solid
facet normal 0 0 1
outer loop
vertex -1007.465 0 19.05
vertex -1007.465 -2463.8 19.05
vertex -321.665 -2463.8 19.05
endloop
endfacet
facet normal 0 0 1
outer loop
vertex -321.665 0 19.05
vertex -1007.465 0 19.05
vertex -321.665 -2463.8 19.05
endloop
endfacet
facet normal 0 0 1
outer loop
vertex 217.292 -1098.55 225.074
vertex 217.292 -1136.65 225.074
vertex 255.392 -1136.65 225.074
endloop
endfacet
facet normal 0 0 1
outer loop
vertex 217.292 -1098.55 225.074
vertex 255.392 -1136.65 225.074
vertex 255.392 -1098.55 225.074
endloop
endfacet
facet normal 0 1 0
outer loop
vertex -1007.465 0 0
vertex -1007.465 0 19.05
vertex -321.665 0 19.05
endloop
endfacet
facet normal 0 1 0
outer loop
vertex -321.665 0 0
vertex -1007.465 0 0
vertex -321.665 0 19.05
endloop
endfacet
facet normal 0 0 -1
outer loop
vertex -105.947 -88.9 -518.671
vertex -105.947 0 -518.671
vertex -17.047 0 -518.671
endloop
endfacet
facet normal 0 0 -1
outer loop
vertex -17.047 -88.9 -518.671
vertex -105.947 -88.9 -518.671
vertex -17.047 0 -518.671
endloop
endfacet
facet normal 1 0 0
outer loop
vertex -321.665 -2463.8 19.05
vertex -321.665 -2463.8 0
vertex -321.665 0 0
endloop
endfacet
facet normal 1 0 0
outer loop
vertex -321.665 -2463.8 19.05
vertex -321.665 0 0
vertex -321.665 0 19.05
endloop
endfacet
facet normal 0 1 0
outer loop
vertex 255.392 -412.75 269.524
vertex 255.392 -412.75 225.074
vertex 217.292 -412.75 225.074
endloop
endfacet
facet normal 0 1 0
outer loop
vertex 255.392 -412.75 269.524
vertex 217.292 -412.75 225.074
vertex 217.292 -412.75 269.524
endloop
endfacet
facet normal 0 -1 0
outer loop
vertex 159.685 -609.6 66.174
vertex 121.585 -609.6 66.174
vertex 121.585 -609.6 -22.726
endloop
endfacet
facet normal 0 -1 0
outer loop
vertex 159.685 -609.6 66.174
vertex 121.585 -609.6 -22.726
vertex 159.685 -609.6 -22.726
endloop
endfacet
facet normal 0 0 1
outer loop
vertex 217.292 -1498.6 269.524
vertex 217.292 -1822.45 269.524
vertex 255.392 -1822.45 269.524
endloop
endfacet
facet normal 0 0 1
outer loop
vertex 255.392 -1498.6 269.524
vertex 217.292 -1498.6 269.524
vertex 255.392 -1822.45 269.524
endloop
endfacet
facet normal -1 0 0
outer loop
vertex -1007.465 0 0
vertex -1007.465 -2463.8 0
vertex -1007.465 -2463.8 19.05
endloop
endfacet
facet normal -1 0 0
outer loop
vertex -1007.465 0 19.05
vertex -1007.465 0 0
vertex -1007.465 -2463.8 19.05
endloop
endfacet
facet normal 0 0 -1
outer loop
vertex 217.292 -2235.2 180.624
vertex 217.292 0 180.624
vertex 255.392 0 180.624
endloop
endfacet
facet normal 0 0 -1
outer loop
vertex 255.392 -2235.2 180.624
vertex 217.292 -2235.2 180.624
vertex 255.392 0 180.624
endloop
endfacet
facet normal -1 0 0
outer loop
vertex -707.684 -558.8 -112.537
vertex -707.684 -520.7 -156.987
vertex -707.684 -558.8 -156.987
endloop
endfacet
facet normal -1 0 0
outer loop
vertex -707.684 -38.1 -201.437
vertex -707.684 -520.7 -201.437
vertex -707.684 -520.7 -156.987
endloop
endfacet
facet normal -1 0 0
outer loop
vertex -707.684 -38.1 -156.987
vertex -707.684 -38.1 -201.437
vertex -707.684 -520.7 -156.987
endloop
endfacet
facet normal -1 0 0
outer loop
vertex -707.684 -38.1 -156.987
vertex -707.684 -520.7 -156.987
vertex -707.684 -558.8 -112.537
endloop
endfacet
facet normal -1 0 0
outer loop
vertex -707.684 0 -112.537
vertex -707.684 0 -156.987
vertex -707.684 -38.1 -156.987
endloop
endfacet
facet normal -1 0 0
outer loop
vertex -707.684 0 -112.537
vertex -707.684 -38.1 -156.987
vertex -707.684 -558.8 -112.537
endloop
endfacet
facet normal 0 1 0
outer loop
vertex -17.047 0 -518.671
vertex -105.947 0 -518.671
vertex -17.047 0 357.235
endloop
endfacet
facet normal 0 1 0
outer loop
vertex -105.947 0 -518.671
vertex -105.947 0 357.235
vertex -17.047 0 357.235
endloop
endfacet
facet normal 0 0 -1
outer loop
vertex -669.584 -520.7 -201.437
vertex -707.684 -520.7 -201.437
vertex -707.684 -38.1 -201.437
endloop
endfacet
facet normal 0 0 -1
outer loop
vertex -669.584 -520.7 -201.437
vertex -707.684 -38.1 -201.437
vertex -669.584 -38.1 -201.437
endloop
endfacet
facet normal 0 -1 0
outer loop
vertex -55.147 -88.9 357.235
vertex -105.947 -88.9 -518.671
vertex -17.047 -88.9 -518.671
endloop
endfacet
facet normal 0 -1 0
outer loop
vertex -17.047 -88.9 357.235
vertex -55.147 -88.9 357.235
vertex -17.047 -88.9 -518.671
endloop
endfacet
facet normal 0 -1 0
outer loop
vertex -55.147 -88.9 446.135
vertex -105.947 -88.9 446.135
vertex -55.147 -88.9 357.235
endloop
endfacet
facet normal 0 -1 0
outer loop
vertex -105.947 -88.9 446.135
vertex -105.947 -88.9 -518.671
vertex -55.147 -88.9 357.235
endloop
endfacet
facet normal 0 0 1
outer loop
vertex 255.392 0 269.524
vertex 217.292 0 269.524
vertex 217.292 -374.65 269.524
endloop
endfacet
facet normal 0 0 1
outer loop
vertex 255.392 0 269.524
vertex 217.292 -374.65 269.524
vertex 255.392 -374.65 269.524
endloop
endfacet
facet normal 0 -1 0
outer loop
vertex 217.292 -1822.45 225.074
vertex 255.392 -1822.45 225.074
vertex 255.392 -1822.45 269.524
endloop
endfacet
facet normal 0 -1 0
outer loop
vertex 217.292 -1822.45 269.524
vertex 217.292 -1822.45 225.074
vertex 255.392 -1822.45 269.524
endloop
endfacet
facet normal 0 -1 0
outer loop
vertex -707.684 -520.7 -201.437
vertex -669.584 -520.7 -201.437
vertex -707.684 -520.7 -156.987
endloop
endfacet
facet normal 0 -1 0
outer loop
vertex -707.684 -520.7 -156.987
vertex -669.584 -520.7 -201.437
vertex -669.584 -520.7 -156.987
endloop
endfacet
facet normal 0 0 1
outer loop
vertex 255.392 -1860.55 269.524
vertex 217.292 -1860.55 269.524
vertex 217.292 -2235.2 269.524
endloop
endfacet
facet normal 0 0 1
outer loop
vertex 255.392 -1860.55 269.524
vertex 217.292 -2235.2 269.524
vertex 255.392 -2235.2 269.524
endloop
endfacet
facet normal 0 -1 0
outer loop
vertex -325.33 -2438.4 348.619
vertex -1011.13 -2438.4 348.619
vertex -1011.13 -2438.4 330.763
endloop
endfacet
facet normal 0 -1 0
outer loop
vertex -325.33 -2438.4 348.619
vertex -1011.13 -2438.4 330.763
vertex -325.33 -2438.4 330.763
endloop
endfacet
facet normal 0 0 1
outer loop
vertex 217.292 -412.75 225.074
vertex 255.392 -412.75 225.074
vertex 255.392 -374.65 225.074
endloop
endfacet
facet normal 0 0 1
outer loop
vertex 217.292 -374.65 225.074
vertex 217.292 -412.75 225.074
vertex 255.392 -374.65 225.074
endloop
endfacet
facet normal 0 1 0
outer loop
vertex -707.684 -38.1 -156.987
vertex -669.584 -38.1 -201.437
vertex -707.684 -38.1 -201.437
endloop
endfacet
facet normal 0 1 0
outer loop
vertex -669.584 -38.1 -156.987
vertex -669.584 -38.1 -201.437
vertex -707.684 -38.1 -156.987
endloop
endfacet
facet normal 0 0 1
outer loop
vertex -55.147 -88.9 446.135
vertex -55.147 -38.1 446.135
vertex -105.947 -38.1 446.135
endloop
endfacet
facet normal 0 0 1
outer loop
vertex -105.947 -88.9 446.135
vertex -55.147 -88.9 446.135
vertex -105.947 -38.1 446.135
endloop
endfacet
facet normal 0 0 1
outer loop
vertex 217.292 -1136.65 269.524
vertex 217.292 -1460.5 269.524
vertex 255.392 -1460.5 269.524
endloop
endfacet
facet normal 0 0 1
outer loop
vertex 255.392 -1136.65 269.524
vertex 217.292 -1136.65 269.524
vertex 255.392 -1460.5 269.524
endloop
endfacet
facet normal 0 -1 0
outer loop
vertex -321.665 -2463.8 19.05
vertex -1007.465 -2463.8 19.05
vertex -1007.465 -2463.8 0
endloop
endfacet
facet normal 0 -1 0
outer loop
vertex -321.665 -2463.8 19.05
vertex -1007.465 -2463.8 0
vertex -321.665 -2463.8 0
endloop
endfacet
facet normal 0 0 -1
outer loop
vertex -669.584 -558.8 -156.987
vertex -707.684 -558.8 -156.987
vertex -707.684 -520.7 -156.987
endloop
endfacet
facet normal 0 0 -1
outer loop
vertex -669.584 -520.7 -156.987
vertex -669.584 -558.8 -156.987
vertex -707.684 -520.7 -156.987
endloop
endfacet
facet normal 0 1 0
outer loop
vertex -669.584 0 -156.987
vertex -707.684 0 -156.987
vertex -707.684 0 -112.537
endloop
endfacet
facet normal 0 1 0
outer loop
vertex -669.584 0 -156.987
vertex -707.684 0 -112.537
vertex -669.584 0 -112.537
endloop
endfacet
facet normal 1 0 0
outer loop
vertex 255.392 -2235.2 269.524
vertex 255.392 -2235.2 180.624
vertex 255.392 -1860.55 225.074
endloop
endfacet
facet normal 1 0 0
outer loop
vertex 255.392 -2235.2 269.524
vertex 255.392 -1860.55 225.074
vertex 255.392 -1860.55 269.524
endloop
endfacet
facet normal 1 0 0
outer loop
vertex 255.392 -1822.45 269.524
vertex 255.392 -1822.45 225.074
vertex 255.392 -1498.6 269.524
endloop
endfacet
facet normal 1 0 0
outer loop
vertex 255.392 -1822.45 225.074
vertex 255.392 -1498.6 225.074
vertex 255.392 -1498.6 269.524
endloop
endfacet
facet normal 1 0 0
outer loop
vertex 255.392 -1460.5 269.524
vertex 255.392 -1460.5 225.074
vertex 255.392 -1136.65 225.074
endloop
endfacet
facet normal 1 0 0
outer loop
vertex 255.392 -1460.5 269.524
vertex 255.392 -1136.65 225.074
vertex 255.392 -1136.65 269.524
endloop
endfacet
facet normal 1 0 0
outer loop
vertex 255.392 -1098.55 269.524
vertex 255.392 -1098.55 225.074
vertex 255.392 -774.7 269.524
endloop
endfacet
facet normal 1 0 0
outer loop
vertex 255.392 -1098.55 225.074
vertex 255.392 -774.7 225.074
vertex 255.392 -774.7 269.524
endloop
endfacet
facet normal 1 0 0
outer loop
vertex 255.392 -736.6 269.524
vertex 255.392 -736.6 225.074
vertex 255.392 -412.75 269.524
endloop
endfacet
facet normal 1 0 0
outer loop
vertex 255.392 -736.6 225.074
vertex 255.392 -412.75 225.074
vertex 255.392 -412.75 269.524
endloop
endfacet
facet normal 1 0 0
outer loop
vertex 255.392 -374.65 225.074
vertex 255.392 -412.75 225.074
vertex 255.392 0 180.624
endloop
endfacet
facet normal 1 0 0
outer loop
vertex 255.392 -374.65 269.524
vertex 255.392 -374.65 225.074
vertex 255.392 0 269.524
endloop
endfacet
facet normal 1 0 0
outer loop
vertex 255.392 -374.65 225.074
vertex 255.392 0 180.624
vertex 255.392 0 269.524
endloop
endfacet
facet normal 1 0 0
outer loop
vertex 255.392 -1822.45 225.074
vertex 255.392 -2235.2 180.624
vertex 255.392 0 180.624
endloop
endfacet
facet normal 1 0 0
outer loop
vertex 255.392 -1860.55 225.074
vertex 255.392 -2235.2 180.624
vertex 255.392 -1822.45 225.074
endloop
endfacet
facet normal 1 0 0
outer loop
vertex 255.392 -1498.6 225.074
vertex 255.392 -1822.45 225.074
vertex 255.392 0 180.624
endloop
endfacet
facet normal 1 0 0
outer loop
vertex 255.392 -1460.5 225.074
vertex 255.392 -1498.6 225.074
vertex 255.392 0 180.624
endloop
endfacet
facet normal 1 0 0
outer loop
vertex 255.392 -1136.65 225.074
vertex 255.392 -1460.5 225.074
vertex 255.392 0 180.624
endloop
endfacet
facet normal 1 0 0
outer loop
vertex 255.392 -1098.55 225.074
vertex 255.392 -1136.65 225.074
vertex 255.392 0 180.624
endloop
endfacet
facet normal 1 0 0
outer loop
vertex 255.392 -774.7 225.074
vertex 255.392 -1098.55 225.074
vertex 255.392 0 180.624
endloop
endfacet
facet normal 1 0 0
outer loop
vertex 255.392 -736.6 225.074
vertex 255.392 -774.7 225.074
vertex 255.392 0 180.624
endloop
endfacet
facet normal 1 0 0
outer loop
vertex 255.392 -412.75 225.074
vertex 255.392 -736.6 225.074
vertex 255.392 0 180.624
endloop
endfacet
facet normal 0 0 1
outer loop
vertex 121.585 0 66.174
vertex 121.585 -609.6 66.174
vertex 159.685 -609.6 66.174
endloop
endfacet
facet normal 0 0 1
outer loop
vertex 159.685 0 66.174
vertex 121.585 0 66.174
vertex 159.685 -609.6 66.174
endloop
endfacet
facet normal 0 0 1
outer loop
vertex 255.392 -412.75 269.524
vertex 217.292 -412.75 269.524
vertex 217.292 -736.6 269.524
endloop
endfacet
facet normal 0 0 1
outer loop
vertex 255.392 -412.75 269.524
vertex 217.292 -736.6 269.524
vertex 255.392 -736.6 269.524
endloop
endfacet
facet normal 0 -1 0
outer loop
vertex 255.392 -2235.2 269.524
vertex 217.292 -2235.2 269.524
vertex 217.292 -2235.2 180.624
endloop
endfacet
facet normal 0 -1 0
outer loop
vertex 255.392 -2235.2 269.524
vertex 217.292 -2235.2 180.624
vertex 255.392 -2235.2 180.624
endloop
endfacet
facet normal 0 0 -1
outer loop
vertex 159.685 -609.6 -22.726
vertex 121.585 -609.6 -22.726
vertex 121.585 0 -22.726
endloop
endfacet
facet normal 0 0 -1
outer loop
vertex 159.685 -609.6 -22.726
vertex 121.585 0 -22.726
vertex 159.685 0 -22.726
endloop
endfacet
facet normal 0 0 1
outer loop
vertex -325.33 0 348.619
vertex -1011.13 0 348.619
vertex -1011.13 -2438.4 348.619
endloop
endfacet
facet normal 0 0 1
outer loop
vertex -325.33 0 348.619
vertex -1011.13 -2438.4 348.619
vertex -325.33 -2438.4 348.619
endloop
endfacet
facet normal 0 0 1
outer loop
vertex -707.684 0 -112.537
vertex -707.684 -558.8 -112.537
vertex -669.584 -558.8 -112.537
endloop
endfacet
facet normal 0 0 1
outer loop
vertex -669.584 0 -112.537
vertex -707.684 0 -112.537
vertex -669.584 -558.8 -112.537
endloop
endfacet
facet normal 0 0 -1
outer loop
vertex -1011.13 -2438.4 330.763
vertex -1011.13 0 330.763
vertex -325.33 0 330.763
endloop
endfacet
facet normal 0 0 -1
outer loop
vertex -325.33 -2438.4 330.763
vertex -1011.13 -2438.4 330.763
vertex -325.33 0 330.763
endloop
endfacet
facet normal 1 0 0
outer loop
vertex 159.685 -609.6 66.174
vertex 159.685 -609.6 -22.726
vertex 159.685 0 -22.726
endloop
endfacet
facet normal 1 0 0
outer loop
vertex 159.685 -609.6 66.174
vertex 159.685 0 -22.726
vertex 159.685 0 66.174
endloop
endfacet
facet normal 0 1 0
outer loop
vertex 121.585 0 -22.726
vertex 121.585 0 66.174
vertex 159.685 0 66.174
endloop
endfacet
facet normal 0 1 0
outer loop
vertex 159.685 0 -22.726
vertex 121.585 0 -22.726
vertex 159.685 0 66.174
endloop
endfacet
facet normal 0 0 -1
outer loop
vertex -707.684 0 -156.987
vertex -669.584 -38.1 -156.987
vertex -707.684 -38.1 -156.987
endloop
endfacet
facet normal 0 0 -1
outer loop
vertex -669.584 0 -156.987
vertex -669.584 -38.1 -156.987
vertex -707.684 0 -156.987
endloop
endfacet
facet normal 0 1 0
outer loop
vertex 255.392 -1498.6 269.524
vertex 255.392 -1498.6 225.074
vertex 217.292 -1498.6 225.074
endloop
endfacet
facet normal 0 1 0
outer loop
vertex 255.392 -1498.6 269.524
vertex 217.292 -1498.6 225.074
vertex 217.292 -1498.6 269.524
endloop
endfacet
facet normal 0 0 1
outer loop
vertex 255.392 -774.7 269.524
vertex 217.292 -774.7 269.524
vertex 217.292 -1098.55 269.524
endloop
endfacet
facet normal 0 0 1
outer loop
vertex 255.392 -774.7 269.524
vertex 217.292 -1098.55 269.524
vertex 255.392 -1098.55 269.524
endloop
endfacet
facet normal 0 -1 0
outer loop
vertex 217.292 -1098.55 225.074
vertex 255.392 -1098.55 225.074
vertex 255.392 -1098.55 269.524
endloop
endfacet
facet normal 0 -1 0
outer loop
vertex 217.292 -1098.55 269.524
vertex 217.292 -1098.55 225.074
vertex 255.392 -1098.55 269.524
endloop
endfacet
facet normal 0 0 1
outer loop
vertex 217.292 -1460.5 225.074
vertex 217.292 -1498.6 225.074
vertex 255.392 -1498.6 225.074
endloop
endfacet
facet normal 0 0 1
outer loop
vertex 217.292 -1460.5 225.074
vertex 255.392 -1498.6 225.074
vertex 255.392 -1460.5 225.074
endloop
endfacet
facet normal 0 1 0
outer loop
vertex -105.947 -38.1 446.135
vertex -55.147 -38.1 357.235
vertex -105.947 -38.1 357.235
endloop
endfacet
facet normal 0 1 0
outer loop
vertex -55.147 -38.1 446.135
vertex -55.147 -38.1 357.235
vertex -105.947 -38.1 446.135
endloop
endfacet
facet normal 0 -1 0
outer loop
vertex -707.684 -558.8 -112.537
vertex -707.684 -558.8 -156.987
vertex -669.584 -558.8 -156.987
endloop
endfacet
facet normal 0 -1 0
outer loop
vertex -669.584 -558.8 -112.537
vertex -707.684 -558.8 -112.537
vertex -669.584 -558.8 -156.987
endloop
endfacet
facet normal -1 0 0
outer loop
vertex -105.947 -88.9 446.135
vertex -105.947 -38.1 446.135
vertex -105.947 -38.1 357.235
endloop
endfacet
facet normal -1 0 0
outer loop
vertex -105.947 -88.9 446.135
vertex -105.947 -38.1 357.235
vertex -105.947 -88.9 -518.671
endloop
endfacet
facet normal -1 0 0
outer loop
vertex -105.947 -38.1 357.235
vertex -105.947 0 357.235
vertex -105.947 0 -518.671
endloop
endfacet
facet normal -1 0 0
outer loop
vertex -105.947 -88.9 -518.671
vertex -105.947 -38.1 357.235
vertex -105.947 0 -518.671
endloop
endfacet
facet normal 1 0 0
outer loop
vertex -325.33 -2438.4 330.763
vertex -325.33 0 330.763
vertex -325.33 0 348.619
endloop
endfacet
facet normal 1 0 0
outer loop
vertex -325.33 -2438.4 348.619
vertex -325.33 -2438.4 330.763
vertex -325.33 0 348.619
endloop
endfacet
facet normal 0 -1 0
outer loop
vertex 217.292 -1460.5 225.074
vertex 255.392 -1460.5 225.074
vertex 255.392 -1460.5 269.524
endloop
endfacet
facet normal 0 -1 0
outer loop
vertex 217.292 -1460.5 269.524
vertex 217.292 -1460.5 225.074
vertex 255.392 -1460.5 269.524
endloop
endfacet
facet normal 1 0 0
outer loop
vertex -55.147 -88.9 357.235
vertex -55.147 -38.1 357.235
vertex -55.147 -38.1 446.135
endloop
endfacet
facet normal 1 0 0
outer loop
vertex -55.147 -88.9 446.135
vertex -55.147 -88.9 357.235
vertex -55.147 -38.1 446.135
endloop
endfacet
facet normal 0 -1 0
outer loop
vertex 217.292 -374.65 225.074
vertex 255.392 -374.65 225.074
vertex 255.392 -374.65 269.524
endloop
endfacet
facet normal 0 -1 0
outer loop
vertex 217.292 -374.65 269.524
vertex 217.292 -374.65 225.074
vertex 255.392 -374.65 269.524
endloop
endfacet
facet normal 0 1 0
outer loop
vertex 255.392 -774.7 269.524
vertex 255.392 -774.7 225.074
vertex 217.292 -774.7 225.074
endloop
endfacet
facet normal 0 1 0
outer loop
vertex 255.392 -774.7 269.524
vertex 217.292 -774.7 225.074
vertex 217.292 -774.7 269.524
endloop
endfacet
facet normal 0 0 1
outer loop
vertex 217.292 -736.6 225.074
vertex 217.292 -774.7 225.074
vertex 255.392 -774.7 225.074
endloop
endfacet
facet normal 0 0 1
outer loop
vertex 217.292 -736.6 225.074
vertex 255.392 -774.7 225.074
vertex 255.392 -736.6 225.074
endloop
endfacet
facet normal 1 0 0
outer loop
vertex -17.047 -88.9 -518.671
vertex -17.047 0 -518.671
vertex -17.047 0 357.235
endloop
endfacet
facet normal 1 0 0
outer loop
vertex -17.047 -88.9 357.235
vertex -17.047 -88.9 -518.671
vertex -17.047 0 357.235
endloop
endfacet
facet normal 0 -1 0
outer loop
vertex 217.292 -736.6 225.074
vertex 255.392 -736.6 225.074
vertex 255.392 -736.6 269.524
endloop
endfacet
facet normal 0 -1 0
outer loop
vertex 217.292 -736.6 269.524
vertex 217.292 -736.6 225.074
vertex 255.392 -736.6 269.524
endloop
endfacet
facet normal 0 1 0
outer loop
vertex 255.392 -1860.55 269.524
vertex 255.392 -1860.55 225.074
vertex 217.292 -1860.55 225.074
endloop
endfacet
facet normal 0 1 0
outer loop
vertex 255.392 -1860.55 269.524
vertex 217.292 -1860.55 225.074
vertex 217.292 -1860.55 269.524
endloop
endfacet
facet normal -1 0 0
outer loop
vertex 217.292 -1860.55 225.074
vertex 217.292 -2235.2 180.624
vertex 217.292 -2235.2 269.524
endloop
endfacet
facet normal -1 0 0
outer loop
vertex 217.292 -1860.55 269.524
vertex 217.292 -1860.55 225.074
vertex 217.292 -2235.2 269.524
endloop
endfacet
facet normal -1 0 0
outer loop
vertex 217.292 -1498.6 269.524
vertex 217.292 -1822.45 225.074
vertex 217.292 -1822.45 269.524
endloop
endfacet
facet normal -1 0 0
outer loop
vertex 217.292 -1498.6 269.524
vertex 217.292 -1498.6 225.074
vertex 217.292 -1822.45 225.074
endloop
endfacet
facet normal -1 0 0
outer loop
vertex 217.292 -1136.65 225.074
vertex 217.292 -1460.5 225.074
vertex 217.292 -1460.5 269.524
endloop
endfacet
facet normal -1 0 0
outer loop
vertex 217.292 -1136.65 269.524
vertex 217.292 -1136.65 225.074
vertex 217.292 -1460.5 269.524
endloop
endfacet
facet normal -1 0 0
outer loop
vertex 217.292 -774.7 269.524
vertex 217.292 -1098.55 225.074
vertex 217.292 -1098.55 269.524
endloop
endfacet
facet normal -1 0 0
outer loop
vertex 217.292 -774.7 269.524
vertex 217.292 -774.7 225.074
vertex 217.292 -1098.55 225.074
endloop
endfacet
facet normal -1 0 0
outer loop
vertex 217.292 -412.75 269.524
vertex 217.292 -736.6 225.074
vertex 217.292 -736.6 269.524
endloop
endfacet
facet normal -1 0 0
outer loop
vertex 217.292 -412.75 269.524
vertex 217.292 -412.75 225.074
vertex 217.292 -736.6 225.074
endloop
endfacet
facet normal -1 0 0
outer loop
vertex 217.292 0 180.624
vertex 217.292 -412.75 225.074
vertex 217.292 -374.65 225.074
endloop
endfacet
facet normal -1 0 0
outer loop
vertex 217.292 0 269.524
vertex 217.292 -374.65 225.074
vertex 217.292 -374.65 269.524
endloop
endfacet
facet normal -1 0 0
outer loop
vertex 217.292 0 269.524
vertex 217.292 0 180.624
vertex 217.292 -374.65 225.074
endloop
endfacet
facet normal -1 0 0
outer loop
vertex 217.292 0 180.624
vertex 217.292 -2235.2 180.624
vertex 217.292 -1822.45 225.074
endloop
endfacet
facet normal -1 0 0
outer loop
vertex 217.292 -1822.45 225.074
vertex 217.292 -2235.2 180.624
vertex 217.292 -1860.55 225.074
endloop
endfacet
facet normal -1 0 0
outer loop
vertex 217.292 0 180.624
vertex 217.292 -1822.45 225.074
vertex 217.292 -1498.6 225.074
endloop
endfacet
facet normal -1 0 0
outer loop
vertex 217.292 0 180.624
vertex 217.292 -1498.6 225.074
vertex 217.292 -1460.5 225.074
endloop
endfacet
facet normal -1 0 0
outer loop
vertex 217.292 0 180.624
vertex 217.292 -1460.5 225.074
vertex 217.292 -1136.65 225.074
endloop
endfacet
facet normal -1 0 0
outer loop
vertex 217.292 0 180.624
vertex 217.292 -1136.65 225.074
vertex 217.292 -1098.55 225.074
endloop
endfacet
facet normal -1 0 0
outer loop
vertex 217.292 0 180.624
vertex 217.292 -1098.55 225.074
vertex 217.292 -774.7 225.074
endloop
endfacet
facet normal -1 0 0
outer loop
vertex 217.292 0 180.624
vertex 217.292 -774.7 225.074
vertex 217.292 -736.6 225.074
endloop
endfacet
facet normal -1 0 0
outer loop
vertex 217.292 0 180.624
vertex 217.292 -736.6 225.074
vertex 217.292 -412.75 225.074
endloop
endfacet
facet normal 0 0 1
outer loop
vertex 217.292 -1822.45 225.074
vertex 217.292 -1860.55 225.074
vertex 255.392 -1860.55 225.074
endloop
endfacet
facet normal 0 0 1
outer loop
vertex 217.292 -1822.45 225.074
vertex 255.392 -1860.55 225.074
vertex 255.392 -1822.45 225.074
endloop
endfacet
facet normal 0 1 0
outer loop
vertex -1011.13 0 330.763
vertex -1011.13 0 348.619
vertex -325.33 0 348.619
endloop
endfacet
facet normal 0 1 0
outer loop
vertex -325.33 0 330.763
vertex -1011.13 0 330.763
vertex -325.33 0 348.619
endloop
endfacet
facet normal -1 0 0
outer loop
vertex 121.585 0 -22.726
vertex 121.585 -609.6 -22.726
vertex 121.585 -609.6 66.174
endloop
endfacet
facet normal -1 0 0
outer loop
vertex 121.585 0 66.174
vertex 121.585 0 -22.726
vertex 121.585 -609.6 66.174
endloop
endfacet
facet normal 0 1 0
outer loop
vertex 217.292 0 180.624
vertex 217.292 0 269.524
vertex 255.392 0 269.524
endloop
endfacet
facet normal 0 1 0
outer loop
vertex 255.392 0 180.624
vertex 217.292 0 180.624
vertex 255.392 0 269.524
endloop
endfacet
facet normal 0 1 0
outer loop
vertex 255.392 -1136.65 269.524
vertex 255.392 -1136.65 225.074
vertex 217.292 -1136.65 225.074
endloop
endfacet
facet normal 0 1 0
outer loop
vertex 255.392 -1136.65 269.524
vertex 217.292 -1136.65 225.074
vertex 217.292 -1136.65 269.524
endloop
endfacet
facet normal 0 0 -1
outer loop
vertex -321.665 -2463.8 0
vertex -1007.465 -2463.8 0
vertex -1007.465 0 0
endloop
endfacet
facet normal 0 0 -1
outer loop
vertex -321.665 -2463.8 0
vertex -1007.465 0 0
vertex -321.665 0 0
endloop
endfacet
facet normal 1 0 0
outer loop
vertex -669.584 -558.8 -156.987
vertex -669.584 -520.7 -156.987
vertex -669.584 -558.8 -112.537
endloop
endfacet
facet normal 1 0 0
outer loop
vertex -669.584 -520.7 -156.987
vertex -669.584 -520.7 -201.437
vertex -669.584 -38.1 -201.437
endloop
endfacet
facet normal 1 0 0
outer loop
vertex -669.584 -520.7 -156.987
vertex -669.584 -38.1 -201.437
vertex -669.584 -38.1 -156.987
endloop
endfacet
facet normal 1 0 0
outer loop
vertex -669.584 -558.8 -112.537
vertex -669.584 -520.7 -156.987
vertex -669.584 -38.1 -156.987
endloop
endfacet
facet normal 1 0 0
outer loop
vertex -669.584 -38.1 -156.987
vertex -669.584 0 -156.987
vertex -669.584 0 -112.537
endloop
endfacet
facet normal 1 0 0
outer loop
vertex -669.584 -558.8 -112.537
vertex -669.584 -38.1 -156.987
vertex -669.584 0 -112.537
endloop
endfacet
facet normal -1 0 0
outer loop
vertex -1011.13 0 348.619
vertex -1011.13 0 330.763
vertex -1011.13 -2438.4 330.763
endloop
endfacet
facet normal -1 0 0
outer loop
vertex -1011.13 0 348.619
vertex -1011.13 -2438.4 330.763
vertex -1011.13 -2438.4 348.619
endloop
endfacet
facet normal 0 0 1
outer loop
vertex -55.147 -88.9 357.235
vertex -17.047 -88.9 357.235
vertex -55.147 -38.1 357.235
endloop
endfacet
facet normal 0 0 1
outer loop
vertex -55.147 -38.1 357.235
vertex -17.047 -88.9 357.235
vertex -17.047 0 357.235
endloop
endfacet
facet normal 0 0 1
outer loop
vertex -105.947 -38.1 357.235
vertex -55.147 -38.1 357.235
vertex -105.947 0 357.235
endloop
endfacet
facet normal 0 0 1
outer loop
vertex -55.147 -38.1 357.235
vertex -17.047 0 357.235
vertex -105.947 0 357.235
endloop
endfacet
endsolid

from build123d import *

# Parameters (mm, degrees)
F1_DEPTH  = 88.9
F2_W      = 38.1
F2_H      = 88.9
F3_DEPTH  = 50.8
F4_W      = 38.1
F4_H      = 88.9
F5_DEPTH  = 2235.2
F7_W      = 38.1
F7_H      = 88.9
F8_DEPTH  = 609.6
F9_W      = 685.8
F9_H      = 19.05
F10_DEPTH = 2463.8
F6_W      = 38.1
F6_H      = 44.45
F11_DEPTH = 38.1
F12_W     = 38.1
F12_H     = 88.9
F13_DEPTH = 558.8
F14_W     = 38.1
F14_H     = 44.45
F15_DEPTH = 38.1
F16_W     = 685.8
F16_H     = 17.8562
F17_DEPTH = 2438.4


with BuildPart() as f1:
    # F0 (on Front) → F1 (new body)
    with BuildSketch(Plane.XZ):
        Polygon((-17.0468537569, -518.6711472642), (-17.0468537569, 357.2351527358), (-55.1468537569, 357.2351527358), (-55.1468537569, 446.1351527358), (-105.9468537569, 446.1351527358), (-105.9468537569, -518.6711472642), align=None)
    extrude(amount=F1_DEPTH)

    # F2 (on face) → F3 (cut, through all)
    with BuildSketch(Plane.YZ.offset(-55.1468537569)):
        with Locations((-19.05, 401.6851527358)):
            Rectangle(F2_W, F2_H)
    extrude(amount=-F3_DEPTH, mode=Mode.SUBTRACT)


with BuildPart() as f5:
    # F4 (on Front) → F5 (new body)
    with BuildSketch(Plane.XZ):
        with Locations((236.3417492897, 225.0739336014)):
            Rectangle(F4_W, F4_H)
    extrude(amount=F5_DEPTH)

    # F6 (on face) → F11 (cut, through all)
    with BuildSketch(Plane.YZ.offset(255.3917492897)):
        with Locations((-1841.5, 247.2989336014)):
            Rectangle(F6_W, F6_H)
        with Locations((-1479.55, 247.2989336014)):
            Rectangle(F6_W, F6_H)
        with Locations((-1117.6, 247.2989336014)):
            Rectangle(F6_W, F6_H)
        with Locations((-755.65, 247.2989336014)):
            Rectangle(F6_W, F6_H)
        with Locations((-393.7, 247.2989336014)):
            Rectangle(F6_W, F6_H)
    extrude(amount=-F11_DEPTH, mode=Mode.SUBTRACT)


with BuildPart() as f8:
    # F7 (on Front) → F8 (new body)
    with BuildSketch(Plane.XZ):
        with Locations((140.6347565353, 21.7243745106)):
            Rectangle(F7_W, F7_H)
    extrude(amount=F8_DEPTH)


with BuildPart() as f10:
    # F9 (on Front) → F10 (new body)
    with BuildSketch(Plane.XZ):
        with Locations((-664.5654184074, 9.525)):
            Rectangle(F9_W, F9_H)
    extrude(amount=F10_DEPTH)


with BuildPart() as f13:
    # F12 (on Front) → F13 (new body)
    with BuildSketch(Plane.XZ):
        with Locations((-688.6338591576, -156.9873003576)):
            Rectangle(F12_W, F12_H)
    extrude(amount=F13_DEPTH)

    # F14 (on face) → F15 (cut, through all)
    with BuildSketch(Plane.YZ.offset(-669.5838591576)):
        with Locations((-539.75, -179.2123003576)):
            Rectangle(F14_W, F14_H)
        with Locations((-19.05, -179.2123003576)):
            Rectangle(F14_W, F14_H)
    extrude(amount=-F15_DEPTH, mode=Mode.SUBTRACT)


with BuildPart() as f17:
    # F16 (on Front) → F17 (new body)
    with BuildSketch(Plane.XZ):
        with Locations((-668.230175972, 339.6906721428)):
            Rectangle(F16_W, F16_H)
    extrude(amount=F17_DEPTH)


solid = Compound([f1.part, f5.part, f8.part, f10.part, f13.part, f17.part])
